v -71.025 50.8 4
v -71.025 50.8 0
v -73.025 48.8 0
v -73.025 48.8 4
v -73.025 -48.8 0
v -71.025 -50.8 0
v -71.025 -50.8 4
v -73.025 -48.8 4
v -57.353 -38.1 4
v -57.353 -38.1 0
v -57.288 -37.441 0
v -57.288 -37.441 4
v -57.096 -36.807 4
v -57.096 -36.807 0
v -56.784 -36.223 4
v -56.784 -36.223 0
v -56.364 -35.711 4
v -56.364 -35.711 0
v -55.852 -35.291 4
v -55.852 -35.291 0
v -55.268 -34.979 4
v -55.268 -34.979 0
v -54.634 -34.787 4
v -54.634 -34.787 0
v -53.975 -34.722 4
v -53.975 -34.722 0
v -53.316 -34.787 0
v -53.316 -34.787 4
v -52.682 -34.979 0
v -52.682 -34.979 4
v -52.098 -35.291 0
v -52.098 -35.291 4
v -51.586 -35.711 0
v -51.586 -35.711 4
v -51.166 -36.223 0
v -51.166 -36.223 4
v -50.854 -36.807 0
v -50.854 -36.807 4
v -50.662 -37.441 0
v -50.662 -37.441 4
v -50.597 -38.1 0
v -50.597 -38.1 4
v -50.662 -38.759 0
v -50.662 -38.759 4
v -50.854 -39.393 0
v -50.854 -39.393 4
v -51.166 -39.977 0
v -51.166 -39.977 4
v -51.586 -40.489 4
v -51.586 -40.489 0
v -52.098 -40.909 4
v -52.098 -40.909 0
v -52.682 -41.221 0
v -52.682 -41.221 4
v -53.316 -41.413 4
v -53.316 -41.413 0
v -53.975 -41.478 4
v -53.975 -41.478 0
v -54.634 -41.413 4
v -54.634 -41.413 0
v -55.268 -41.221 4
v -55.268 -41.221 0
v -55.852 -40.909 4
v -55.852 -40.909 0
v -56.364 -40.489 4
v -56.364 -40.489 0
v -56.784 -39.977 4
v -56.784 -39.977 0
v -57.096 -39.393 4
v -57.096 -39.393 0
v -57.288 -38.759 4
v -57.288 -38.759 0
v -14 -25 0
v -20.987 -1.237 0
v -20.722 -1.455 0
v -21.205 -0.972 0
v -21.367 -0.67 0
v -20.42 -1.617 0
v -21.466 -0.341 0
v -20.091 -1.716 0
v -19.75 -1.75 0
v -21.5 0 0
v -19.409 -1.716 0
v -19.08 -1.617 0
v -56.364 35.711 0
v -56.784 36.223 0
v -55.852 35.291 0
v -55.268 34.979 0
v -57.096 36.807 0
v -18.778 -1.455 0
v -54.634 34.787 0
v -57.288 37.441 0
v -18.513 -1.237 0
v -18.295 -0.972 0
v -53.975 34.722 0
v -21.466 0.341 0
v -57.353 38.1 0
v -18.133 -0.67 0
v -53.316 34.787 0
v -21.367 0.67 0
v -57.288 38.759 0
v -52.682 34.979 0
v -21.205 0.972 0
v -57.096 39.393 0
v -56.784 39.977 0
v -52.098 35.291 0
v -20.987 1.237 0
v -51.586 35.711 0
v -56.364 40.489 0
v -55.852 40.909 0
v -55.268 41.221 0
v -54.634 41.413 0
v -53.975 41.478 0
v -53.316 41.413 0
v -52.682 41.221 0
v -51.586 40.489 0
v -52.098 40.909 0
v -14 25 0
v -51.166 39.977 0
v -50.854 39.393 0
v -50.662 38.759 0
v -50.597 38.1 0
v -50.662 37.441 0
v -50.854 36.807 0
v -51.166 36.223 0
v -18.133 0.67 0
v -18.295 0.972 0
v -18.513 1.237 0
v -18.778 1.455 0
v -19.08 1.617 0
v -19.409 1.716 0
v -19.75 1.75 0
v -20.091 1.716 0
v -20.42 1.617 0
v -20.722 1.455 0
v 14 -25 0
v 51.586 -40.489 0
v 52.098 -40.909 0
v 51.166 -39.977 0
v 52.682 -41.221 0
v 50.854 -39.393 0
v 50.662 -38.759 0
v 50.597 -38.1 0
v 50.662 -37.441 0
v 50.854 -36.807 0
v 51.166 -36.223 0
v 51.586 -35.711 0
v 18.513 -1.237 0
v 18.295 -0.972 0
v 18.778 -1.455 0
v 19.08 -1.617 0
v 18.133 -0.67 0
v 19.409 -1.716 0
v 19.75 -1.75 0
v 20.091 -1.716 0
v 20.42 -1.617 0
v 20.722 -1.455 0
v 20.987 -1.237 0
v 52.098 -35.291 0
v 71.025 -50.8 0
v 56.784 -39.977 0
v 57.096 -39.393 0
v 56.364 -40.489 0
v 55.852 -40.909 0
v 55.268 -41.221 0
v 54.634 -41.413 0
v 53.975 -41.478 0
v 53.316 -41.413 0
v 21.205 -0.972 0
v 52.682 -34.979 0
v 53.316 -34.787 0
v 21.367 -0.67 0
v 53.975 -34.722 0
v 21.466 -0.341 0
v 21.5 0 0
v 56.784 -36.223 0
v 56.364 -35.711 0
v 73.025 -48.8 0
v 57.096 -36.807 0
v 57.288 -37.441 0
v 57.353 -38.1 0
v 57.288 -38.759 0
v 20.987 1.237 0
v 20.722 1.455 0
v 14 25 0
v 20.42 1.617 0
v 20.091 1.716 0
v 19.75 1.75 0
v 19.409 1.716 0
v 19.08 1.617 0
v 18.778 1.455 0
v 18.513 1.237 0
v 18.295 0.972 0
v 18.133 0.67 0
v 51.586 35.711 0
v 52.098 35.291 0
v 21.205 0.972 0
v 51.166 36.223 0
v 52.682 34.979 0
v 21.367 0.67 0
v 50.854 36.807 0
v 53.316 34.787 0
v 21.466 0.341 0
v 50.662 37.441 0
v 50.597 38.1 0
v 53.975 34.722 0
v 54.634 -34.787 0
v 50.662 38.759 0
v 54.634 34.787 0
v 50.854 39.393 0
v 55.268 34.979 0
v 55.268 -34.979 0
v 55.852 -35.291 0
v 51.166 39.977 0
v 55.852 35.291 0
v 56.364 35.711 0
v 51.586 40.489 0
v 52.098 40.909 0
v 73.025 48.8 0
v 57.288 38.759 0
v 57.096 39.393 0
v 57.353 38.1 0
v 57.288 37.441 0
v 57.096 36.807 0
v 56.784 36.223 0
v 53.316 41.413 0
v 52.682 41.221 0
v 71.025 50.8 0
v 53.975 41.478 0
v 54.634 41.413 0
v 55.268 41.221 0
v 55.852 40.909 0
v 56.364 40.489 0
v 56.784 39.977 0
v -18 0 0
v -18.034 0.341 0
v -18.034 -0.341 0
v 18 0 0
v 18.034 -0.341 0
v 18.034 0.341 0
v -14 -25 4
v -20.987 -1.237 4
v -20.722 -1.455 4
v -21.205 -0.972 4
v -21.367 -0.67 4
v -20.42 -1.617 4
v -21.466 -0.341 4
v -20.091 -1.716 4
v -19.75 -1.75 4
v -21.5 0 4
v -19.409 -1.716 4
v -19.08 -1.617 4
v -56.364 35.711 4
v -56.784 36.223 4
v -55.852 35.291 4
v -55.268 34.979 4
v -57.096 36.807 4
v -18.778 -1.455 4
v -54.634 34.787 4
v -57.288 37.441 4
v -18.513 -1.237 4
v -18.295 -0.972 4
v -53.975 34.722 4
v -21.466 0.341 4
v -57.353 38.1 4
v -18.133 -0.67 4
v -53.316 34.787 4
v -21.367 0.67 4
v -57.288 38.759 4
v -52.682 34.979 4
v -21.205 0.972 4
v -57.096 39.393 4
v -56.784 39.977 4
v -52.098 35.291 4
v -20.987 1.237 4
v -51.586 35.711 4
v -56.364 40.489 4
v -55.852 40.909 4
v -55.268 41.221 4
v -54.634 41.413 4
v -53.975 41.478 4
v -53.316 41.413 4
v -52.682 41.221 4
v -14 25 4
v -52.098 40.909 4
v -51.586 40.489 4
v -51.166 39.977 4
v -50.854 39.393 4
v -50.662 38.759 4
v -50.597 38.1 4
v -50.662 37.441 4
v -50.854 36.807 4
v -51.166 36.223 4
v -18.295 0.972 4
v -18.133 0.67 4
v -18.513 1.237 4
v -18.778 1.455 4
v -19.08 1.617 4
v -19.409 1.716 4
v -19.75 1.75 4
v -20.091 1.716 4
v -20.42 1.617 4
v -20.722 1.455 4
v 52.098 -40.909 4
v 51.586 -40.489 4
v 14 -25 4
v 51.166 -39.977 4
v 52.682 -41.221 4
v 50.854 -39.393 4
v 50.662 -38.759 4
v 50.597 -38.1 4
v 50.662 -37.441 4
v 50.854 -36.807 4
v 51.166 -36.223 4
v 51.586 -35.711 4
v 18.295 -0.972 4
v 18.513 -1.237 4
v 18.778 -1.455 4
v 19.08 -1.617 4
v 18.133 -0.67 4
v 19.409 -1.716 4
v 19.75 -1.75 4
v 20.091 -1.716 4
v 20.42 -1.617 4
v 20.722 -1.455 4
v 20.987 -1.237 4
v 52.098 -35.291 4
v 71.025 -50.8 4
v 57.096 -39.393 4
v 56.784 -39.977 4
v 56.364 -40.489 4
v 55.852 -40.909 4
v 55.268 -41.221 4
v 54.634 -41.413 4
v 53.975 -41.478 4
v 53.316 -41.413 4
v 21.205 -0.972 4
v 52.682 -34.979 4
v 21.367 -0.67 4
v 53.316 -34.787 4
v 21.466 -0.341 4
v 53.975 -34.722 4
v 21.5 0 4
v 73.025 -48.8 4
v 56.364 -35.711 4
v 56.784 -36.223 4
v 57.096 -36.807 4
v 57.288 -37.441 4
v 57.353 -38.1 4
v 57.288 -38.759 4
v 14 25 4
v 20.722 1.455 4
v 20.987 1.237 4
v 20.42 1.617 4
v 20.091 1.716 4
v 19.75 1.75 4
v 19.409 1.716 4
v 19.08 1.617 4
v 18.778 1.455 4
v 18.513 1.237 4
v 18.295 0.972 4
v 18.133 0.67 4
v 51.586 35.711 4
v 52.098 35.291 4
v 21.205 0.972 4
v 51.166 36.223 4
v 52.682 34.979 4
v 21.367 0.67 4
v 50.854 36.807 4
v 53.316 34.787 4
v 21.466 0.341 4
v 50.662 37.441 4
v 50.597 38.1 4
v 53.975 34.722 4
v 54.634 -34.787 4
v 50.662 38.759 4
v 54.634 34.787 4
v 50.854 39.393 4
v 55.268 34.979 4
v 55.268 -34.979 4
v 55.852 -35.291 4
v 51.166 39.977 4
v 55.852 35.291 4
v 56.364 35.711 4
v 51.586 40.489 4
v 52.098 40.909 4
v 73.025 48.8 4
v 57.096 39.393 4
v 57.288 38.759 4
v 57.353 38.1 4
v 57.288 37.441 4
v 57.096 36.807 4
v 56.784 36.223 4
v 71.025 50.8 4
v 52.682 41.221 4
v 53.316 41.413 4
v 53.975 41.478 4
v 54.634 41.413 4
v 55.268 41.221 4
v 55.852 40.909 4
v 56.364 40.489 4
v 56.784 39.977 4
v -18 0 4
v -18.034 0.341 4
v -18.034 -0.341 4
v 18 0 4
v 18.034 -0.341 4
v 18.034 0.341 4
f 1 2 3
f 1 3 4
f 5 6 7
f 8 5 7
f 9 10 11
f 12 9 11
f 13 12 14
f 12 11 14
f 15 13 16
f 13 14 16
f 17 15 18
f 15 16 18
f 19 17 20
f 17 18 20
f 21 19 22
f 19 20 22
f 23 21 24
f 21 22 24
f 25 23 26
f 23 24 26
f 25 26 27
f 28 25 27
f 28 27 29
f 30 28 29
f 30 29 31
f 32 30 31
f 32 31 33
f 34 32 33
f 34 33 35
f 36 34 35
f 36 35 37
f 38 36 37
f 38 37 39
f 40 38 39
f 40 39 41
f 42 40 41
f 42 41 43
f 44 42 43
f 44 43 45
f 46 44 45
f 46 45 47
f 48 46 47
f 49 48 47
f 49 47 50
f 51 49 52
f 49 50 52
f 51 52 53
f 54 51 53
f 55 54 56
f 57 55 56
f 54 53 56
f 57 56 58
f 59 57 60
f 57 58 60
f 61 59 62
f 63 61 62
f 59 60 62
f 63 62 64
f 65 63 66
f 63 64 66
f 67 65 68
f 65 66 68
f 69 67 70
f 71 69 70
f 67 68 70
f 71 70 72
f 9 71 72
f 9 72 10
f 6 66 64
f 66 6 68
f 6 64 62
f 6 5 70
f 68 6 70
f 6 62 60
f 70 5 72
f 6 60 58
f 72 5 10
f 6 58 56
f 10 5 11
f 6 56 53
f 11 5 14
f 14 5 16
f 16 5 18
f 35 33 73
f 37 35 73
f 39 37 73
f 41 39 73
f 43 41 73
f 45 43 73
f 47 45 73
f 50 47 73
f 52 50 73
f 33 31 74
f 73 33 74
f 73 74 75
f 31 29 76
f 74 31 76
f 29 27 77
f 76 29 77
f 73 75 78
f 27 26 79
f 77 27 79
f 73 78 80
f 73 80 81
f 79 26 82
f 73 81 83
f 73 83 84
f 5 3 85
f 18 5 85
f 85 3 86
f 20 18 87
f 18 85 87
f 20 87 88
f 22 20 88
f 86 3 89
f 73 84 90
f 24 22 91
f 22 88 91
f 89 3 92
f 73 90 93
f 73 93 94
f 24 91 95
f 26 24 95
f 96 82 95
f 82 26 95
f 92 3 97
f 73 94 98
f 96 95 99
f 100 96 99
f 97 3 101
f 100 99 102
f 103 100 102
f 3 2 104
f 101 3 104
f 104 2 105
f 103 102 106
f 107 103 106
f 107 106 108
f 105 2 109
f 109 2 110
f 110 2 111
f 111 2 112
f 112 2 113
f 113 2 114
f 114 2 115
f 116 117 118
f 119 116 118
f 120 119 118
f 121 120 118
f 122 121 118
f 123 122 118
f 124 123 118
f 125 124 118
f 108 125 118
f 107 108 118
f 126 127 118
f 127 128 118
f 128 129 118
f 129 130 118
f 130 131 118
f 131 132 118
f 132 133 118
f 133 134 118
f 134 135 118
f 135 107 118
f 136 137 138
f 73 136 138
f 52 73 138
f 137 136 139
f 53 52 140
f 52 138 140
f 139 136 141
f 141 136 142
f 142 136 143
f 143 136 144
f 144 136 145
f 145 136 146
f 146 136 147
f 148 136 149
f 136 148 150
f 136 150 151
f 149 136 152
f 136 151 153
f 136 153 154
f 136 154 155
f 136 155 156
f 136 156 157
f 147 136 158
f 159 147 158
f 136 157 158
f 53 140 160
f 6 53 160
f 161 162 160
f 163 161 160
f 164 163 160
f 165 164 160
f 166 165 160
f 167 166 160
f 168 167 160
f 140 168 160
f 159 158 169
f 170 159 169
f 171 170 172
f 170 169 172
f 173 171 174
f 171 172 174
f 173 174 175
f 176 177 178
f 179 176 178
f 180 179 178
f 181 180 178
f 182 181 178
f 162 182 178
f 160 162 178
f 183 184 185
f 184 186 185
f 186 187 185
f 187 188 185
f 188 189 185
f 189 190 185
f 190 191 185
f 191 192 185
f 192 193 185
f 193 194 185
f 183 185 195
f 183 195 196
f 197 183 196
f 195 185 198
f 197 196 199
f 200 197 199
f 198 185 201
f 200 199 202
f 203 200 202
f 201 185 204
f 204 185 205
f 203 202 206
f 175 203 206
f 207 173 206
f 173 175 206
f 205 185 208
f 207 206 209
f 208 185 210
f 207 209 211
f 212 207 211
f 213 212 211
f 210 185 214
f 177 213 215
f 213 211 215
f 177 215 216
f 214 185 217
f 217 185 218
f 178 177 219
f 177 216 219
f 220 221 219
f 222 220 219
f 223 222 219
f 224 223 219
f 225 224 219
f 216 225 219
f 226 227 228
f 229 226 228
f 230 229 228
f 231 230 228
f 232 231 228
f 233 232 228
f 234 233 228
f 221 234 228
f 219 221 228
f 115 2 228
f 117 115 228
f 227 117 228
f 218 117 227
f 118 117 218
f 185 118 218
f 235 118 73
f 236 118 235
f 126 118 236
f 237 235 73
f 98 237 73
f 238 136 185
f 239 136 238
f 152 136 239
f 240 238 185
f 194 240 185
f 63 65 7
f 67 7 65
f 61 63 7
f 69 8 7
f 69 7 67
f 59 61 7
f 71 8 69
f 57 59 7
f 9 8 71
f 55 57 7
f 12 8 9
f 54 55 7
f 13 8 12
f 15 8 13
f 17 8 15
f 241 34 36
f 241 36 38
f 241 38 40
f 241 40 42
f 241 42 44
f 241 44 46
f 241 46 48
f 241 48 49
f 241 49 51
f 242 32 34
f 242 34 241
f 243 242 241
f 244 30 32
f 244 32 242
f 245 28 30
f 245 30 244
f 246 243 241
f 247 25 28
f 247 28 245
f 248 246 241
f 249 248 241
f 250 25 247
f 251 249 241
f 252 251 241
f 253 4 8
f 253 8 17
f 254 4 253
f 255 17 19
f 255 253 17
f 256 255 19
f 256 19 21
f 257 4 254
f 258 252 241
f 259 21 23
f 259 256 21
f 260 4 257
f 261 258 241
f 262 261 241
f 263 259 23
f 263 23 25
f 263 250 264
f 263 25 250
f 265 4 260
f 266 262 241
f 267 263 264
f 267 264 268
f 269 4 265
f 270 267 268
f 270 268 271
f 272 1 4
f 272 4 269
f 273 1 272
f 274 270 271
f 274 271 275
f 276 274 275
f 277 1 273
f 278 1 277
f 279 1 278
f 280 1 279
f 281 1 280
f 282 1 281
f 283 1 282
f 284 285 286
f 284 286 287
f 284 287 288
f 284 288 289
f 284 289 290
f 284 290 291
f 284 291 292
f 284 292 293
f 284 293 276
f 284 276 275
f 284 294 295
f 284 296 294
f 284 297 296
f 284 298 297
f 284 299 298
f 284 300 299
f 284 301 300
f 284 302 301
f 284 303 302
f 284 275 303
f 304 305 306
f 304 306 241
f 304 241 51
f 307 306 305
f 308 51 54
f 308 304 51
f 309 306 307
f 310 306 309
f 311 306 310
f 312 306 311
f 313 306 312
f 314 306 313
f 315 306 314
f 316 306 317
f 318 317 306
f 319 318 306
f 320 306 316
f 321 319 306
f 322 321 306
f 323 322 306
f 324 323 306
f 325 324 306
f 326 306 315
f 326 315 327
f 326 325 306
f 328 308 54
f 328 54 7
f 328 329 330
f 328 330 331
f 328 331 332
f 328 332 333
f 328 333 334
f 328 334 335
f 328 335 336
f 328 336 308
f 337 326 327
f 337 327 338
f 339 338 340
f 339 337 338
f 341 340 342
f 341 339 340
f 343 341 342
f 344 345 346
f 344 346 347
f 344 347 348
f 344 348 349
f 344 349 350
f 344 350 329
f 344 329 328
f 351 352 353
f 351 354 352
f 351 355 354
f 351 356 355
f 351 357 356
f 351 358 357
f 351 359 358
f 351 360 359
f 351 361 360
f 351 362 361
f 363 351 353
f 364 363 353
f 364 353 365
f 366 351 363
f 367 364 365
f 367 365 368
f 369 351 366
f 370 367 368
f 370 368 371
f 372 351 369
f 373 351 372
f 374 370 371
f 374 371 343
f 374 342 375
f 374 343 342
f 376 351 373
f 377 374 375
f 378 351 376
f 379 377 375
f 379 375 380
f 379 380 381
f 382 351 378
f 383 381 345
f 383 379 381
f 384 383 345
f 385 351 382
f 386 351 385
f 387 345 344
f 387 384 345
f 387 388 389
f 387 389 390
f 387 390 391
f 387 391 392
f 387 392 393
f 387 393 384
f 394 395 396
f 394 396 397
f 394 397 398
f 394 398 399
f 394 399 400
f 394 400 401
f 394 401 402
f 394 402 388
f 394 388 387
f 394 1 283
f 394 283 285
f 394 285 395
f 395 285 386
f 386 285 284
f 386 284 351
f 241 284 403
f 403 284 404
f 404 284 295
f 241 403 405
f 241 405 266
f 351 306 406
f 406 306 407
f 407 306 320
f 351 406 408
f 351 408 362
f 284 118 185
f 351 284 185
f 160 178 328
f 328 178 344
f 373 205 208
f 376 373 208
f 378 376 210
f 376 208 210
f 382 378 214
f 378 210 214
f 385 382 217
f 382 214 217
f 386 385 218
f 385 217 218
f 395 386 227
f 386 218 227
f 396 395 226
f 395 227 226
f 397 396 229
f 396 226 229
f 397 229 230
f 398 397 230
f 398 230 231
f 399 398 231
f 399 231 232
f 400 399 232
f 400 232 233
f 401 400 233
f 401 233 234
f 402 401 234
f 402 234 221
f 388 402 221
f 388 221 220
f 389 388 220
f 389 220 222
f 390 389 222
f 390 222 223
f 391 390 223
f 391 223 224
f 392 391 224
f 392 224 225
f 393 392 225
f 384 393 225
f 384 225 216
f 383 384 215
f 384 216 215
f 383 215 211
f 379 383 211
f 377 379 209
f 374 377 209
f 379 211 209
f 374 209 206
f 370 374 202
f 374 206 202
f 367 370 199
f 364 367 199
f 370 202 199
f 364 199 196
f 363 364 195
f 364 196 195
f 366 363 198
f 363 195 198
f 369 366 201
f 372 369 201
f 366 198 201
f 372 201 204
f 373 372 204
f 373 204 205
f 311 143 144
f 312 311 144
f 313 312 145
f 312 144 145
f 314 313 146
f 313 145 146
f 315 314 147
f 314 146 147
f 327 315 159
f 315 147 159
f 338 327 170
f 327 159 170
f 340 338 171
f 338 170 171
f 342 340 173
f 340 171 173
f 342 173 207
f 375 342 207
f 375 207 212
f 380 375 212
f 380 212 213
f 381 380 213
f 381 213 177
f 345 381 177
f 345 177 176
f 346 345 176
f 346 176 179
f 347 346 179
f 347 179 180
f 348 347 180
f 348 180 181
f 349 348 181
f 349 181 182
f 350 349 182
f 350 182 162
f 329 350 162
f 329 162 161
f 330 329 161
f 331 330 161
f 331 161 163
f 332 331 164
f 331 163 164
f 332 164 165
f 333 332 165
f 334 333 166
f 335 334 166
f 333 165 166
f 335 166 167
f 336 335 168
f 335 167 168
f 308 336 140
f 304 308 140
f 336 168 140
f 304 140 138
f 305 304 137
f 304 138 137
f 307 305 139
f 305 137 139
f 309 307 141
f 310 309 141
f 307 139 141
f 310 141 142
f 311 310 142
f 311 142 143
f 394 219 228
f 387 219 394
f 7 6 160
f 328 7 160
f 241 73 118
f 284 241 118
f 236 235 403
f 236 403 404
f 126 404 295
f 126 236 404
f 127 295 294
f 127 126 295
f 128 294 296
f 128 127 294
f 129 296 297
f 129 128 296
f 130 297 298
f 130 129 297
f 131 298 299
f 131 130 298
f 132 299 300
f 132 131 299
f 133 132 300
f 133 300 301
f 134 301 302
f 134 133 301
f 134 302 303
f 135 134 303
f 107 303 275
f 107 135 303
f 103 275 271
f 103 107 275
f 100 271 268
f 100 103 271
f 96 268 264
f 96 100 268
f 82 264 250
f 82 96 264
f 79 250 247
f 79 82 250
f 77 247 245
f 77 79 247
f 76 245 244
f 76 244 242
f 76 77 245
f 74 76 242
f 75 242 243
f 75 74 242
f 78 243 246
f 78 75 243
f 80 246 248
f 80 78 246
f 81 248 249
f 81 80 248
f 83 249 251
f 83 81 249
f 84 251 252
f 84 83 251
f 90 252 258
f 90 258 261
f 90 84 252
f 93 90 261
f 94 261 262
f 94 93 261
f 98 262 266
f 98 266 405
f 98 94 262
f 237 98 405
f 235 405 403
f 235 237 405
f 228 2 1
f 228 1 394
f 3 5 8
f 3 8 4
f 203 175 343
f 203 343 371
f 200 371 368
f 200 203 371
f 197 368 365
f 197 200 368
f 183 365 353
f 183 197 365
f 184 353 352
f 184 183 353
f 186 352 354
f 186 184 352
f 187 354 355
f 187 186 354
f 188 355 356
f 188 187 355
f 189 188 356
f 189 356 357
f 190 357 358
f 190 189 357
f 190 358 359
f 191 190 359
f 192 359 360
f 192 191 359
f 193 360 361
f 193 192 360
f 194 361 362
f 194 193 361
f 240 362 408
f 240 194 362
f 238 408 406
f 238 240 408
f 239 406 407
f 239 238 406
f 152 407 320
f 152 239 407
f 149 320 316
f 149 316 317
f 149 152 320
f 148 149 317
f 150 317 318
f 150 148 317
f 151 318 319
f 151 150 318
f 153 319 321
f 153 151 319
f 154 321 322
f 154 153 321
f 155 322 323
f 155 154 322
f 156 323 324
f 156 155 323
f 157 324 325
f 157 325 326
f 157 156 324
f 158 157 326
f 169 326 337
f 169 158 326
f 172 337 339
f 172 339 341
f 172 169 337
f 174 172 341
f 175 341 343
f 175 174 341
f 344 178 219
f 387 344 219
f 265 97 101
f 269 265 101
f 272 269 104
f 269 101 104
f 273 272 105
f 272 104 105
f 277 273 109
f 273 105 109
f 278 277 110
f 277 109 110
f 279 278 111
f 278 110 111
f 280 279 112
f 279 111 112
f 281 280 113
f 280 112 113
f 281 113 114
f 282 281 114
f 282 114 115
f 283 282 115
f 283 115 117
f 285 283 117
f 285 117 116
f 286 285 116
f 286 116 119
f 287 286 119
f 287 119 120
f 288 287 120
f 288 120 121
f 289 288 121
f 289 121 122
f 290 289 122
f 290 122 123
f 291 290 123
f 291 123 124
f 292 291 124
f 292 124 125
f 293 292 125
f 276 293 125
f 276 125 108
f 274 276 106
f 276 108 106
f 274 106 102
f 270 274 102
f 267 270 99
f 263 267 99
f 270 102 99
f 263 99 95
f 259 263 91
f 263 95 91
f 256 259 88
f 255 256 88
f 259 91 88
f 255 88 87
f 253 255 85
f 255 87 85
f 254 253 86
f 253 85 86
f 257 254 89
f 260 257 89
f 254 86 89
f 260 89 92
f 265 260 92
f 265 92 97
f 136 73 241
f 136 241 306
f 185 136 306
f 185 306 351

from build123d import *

# Parameters (mm, degrees)
SKETCH1_W                   = 146.05
SKETCH1_H                   = 101.6
SKETCH1_R                   = 1.75
SKETCH1_W_2                 = 28
SKETCH1_H_2                 = 50
BOSS_EXTRUDE1_DEPTH         = 4
F_1_4_CLEARANCE_HOLE1_D     = 6.7564
F_1_4_CLEARANCE_HOLE1_DEPTH = 12
F_1_4_CLEARANCE_HOLE1_TIP   = 2.029827343
CHAMFER1_SIZE               = 2


with BuildPart() as part:
    # Sketch1 → Boss-Extrude1 (new body)
    with BuildSketch(Plane.XY):
        Rectangle(SKETCH1_W, SKETCH1_H)
        with Locations((-19.75, 0)):
            Circle(SKETCH1_R, mode=Mode.SUBTRACT)
        with Locations((19.75, 0)):
            Circle(SKETCH1_R, mode=Mode.SUBTRACT)
        Rectangle(SKETCH1_W_2, SKETCH1_H_2, mode=Mode.SUBTRACT)
    extrude(amount=BOSS_EXTRUDE1_DEPTH)

    # 1/4 Clearance Hole1
    with Locations(Plane.XY.offset(4)):
        with Locations((-53.975, 38.1), (53.975, 38.1), (53.975, -38.1), (-53.975, -38.1)):
            Hole(F_1_4_CLEARANCE_HOLE1_D / 2, depth=F_1_4_CLEARANCE_HOLE1_DEPTH)
            with Locations((0, 0, -(F_1_4_CLEARANCE_HOLE1_DEPTH + F_1_4_CLEARANCE_HOLE1_TIP / 2))):  # 118° drill point
                Cone(0, F_1_4_CLEARANCE_HOLE1_D / 2, F_1_4_CLEARANCE_HOLE1_TIP, mode=Mode.SUBTRACT)

    # Chamfer1
    chamfer1_edges = [part.edges().sort_by_distance(p)[0] for p in [
        (-73.025, -50.8, 2),
        (-73.025, 50.8, 2),
        (73.025, 50.8, 2),
        (73.025, -50.8, 2),
    ]]
    chamfer(chamfer1_edges, length=CHAMFER1_SIZE)


solid = part.part
